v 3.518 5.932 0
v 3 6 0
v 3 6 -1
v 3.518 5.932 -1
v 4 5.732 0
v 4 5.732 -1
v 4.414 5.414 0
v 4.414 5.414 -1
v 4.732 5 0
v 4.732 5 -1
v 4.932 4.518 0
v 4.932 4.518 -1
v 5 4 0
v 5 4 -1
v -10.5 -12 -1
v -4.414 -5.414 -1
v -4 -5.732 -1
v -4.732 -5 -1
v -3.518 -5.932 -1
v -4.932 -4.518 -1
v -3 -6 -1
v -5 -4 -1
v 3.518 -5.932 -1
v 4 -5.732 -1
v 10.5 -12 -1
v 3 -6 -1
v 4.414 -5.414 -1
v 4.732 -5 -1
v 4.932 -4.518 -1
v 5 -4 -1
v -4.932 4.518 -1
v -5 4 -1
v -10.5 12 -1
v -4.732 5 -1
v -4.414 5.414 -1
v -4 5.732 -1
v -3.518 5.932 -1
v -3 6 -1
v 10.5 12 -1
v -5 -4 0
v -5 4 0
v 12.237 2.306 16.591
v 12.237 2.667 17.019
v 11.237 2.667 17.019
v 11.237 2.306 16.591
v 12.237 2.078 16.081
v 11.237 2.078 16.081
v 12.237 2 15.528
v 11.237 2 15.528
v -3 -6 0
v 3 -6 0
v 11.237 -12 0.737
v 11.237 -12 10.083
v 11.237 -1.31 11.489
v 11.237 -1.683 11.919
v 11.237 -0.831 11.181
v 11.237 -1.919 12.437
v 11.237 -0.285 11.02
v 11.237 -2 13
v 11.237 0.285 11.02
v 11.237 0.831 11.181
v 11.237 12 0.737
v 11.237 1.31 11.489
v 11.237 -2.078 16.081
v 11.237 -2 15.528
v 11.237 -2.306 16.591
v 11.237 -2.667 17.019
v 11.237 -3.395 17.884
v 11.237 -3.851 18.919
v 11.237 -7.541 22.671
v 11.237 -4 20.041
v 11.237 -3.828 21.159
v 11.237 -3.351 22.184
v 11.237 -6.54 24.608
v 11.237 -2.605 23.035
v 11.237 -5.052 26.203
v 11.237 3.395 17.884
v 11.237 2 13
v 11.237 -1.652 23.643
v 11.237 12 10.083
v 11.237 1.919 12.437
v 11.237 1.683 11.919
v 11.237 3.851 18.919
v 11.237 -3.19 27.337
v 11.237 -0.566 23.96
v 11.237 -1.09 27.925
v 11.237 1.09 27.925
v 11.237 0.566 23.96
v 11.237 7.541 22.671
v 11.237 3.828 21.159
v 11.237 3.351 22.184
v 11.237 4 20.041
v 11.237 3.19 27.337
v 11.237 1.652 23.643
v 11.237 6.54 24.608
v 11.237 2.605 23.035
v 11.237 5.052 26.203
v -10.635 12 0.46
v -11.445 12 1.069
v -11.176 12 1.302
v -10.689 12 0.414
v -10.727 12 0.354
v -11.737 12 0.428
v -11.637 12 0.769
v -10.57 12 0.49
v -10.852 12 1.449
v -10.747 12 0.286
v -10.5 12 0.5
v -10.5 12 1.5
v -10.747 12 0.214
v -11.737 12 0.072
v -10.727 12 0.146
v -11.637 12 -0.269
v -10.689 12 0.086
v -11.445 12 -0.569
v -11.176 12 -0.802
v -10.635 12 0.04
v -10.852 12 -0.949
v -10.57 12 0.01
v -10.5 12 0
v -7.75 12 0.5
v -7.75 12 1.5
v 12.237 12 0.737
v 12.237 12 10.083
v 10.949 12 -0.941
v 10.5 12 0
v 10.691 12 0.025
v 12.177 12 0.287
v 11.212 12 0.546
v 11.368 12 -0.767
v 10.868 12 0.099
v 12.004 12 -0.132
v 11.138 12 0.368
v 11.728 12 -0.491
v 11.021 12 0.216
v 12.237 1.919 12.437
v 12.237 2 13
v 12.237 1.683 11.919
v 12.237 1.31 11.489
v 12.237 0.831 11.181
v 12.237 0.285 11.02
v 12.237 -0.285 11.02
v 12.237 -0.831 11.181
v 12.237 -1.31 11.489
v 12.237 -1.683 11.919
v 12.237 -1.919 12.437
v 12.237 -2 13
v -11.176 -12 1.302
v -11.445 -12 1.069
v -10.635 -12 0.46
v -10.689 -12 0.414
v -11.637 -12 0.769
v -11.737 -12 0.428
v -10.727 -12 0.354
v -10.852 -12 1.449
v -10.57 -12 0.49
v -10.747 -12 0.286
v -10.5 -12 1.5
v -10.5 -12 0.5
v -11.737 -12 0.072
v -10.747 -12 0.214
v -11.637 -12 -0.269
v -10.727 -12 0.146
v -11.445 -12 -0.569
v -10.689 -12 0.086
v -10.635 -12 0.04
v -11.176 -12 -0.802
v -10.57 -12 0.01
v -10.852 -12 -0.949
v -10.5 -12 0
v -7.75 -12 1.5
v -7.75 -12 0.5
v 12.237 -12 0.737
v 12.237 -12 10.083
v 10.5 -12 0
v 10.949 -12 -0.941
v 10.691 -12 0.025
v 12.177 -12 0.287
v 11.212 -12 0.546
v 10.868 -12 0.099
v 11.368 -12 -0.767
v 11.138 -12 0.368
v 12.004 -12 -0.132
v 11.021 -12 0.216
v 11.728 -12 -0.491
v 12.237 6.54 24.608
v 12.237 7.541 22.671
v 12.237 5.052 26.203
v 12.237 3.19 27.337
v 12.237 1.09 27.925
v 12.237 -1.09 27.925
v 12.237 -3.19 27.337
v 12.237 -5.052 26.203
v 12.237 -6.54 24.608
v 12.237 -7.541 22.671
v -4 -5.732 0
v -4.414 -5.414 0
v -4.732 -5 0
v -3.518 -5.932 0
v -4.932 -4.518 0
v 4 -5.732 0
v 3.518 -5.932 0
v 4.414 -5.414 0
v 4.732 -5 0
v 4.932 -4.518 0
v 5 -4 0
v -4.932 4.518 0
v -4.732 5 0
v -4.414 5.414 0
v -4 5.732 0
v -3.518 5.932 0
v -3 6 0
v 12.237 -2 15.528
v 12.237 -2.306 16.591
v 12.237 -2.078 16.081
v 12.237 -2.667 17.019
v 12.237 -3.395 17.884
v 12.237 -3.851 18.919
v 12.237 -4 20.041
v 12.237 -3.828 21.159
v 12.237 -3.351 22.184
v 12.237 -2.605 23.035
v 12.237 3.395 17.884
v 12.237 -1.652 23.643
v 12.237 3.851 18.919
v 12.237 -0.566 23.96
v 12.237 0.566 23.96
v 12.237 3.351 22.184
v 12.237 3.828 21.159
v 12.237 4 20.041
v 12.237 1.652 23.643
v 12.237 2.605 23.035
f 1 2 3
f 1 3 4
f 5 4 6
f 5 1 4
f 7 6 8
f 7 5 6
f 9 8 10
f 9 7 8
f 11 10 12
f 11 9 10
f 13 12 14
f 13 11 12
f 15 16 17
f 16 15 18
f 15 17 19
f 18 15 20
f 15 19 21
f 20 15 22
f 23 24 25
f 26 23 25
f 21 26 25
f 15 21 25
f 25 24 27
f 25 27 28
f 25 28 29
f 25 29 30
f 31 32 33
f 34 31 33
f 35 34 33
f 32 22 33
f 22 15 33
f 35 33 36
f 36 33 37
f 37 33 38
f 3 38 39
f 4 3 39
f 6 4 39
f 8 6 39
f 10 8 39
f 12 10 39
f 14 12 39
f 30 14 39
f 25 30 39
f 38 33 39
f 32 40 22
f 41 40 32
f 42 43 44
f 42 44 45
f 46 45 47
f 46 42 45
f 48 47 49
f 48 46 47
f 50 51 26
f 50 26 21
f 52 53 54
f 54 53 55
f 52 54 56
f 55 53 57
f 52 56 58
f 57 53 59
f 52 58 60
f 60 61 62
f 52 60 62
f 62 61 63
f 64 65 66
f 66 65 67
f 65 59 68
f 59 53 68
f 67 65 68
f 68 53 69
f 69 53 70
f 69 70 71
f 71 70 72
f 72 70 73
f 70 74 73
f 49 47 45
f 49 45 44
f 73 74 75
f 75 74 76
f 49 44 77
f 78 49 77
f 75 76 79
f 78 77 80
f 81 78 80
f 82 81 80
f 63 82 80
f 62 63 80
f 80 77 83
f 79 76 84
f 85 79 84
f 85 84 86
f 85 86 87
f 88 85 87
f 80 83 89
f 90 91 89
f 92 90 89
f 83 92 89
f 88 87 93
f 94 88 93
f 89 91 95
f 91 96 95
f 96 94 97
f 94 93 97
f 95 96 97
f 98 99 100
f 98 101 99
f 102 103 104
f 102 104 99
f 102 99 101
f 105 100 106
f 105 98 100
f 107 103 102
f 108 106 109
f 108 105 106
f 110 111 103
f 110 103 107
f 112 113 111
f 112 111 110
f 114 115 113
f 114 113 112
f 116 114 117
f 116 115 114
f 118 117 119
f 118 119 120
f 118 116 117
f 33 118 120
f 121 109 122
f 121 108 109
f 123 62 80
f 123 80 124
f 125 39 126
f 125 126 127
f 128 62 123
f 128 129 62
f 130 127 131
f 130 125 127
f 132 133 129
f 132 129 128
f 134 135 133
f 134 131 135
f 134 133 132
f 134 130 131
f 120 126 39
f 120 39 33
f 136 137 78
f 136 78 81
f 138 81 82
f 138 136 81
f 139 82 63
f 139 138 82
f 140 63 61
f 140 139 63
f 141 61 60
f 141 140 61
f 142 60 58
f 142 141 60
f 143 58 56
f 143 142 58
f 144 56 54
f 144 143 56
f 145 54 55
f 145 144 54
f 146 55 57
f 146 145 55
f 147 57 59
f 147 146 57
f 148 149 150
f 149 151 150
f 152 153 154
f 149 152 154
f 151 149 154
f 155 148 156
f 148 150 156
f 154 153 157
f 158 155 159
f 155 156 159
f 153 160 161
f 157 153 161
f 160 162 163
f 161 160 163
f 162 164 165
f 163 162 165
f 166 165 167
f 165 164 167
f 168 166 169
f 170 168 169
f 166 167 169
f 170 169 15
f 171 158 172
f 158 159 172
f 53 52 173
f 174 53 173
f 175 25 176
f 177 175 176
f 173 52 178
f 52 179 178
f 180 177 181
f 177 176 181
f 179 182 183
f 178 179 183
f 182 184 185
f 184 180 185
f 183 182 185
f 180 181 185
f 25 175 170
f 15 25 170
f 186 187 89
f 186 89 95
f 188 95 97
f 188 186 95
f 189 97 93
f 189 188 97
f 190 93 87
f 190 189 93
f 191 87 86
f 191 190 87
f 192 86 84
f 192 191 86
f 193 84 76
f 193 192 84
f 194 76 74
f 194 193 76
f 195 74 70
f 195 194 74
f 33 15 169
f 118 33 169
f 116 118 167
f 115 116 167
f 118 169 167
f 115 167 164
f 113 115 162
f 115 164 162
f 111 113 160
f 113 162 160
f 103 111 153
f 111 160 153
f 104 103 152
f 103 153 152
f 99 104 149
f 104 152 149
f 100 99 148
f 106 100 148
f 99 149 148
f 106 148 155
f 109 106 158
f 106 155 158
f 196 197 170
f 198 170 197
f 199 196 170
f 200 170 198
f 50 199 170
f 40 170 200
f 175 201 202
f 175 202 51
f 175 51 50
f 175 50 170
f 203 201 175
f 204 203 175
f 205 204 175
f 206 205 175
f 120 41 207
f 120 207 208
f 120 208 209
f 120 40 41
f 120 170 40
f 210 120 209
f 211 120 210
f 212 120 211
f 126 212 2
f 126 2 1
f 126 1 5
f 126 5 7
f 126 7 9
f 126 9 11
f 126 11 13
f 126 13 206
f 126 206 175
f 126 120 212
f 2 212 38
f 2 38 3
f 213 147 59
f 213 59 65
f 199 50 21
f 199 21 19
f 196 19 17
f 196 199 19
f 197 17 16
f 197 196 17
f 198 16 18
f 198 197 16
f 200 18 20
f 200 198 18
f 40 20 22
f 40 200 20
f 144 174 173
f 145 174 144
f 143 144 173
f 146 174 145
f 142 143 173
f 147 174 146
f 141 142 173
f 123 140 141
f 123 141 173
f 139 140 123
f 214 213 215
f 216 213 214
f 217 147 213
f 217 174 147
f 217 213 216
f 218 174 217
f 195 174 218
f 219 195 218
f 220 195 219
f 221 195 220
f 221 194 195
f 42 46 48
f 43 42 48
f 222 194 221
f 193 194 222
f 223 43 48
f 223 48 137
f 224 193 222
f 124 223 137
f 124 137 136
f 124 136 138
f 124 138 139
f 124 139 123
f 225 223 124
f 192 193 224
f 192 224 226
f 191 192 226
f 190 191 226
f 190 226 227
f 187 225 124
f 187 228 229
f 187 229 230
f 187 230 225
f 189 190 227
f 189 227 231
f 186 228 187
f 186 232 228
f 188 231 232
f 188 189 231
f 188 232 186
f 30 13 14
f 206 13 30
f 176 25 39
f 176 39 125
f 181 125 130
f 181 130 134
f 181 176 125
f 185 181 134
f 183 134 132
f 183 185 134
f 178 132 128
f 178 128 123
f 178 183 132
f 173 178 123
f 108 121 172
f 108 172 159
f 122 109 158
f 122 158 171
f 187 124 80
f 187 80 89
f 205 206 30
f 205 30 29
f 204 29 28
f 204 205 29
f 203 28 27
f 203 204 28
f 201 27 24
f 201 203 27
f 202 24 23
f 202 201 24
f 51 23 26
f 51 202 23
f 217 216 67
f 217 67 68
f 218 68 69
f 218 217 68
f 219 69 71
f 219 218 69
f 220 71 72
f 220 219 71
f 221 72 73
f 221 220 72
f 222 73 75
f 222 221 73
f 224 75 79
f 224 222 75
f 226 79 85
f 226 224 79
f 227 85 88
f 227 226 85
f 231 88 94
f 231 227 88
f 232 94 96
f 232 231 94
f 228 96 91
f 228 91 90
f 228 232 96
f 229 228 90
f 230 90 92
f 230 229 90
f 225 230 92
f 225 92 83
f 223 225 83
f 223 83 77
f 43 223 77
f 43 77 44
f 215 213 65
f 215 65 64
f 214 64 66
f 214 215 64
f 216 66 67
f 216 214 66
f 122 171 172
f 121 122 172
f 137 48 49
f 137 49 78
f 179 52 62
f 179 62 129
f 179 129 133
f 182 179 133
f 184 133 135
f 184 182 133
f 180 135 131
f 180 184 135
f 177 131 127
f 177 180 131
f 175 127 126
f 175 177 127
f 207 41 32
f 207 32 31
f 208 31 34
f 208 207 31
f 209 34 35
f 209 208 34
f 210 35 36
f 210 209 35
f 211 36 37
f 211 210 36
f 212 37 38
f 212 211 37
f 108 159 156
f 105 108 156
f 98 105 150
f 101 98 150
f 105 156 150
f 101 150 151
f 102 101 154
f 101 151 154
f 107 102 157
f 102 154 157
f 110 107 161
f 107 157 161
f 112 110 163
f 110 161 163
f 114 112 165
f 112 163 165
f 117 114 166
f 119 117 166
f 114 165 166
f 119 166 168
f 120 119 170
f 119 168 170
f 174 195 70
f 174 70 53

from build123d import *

# Parameters (mm, degrees)
SKETCH1_W               = 21
SKETCH1_H               = 24
BASE_FLANGE1_DEPTH      = 1
EDGE_FLANGE1_DEPTH      = 24
EDGE_FLANGE1_START      = 1
EDGE_FLANGE1_FLAT_DEPTH = 1
HEM1_START              = -12
HEM1_DEPTH              = 24


# Read off the part's stored shape, not the designer's step: Hem1
# Sheet-metal steps are written as plain solids
with BuildPart() as part:
    # Sketch1 → Base-Flange1 (new body)
    with BuildSketch(Plane.XY):
        Rectangle(SKETCH1_W, SKETCH1_H)
        with BuildLine():
            Line((-3, 6), (3, 6))
            ThreePointArc((3, 6), (4.414213562, 5.414213562), (5, 4))
            Line((5, 4), (5, -4))
            ThreePointArc((5, -4), (4.414213562, -5.414213562), (3, -6))
            Line((3, -6), (-3, -6))
            ThreePointArc((-3, -6), (-4.414213562, -5.414213562), (-5, -4))
            Line((-5, -4), (-5, 4))
            ThreePointArc((-5, 4), (-4.414213562, 5.414213562), (-3, 6))
        make_face(mode=Mode.SUBTRACT)
    extrude(amount=-BASE_FLANGE1_DEPTH)

    # Edge-Flange1 bend section (across the edge) → Edge-Flange1 (add)
    with BuildSketch(Plane(origin=(11.2366, -12, 0), x_dir=(-1, 0, 0), z_dir=(0, 1, 0))):
        with BuildLine():
            Line((-1, 0.7366), (0, 0.7366))
            ThreePointArc((0, 0.7366), (0.215745145, 0.215745145), (0.7366, 0))
            Line((0.7366, 0), (0.7366, -1))
            ThreePointArc((0.7366, -1), (-0.491361636, -0.491361636), (-1, 0.7366))
        make_face()
    extrude(amount=EDGE_FLANGE1_DEPTH)

    # Edge-Flange1 profile (on flange) → Edge-Flange1 flat (add)
    with BuildSketch(Plane.YZ.offset(11.2366).offset(EDGE_FLANGE1_START)):
        with BuildLine():
            ThreePointArc((7.540895956, 22.671121147), (0, 28), (-7.540895956, 22.671121147))
            Line((-7.540895956, 22.671121147), (-12, 10.082534632))
            Line((-12, 10.082534632), (-12, 0.7366))
            Line((-12, 0.7366), (12, 0.7366))
            Line((12, 0.7366), (12, 10.082534632))
            Line((12, 10.082534632), (7.540895956, 22.671121147))
        make_face()
        with BuildLine():
            ThreePointArc((2, 13), (0, 11), (-2, 13))
            Line((-2, 13), (-2, 15.527864045))
            ThreePointArc((-2, 15.527864045), (-2.174258142, 16.344360626), (-2.666666667, 17.01857603))
            ThreePointArc((-2.666666667, 17.01857603), (0, 24), (2.666666667, 17.01857603))
            ThreePointArc((2.666666667, 17.01857603), (2.174258142, 16.344360626), (2, 15.527864045))
            Line((2, 15.527864045), (2, 13))
        make_face(mode=Mode.SUBTRACT)
    extrude(amount=-EDGE_FLANGE1_FLAT_DEPTH)

    # Hem1 outline → Hem1 (add)
    with BuildSketch(Plane(origin=(0, 0, 0), x_dir=(1, 0, 0), z_dir=(0, 1, 0)).offset(HEM1_START)):
        with BuildLine():
            Line((-7.75, -1.5), (-7.75, -0.5))
            Line((-7.75, -0.5), (-10.5, -0.5))
            ThreePointArc((-10.5, -0.5), (-10.75, -0.25), (-10.5, 0))
            Line((-10.5, 0), (-10.5, 1))
            ThreePointArc((-10.5, 1), (-11.75, -0.25), (-10.5, -1.5))
            Line((-10.5, -1.5), (-7.75, -1.5))
        make_face()
    extrude(amount=HEM1_DEPTH)


solid = part.part
